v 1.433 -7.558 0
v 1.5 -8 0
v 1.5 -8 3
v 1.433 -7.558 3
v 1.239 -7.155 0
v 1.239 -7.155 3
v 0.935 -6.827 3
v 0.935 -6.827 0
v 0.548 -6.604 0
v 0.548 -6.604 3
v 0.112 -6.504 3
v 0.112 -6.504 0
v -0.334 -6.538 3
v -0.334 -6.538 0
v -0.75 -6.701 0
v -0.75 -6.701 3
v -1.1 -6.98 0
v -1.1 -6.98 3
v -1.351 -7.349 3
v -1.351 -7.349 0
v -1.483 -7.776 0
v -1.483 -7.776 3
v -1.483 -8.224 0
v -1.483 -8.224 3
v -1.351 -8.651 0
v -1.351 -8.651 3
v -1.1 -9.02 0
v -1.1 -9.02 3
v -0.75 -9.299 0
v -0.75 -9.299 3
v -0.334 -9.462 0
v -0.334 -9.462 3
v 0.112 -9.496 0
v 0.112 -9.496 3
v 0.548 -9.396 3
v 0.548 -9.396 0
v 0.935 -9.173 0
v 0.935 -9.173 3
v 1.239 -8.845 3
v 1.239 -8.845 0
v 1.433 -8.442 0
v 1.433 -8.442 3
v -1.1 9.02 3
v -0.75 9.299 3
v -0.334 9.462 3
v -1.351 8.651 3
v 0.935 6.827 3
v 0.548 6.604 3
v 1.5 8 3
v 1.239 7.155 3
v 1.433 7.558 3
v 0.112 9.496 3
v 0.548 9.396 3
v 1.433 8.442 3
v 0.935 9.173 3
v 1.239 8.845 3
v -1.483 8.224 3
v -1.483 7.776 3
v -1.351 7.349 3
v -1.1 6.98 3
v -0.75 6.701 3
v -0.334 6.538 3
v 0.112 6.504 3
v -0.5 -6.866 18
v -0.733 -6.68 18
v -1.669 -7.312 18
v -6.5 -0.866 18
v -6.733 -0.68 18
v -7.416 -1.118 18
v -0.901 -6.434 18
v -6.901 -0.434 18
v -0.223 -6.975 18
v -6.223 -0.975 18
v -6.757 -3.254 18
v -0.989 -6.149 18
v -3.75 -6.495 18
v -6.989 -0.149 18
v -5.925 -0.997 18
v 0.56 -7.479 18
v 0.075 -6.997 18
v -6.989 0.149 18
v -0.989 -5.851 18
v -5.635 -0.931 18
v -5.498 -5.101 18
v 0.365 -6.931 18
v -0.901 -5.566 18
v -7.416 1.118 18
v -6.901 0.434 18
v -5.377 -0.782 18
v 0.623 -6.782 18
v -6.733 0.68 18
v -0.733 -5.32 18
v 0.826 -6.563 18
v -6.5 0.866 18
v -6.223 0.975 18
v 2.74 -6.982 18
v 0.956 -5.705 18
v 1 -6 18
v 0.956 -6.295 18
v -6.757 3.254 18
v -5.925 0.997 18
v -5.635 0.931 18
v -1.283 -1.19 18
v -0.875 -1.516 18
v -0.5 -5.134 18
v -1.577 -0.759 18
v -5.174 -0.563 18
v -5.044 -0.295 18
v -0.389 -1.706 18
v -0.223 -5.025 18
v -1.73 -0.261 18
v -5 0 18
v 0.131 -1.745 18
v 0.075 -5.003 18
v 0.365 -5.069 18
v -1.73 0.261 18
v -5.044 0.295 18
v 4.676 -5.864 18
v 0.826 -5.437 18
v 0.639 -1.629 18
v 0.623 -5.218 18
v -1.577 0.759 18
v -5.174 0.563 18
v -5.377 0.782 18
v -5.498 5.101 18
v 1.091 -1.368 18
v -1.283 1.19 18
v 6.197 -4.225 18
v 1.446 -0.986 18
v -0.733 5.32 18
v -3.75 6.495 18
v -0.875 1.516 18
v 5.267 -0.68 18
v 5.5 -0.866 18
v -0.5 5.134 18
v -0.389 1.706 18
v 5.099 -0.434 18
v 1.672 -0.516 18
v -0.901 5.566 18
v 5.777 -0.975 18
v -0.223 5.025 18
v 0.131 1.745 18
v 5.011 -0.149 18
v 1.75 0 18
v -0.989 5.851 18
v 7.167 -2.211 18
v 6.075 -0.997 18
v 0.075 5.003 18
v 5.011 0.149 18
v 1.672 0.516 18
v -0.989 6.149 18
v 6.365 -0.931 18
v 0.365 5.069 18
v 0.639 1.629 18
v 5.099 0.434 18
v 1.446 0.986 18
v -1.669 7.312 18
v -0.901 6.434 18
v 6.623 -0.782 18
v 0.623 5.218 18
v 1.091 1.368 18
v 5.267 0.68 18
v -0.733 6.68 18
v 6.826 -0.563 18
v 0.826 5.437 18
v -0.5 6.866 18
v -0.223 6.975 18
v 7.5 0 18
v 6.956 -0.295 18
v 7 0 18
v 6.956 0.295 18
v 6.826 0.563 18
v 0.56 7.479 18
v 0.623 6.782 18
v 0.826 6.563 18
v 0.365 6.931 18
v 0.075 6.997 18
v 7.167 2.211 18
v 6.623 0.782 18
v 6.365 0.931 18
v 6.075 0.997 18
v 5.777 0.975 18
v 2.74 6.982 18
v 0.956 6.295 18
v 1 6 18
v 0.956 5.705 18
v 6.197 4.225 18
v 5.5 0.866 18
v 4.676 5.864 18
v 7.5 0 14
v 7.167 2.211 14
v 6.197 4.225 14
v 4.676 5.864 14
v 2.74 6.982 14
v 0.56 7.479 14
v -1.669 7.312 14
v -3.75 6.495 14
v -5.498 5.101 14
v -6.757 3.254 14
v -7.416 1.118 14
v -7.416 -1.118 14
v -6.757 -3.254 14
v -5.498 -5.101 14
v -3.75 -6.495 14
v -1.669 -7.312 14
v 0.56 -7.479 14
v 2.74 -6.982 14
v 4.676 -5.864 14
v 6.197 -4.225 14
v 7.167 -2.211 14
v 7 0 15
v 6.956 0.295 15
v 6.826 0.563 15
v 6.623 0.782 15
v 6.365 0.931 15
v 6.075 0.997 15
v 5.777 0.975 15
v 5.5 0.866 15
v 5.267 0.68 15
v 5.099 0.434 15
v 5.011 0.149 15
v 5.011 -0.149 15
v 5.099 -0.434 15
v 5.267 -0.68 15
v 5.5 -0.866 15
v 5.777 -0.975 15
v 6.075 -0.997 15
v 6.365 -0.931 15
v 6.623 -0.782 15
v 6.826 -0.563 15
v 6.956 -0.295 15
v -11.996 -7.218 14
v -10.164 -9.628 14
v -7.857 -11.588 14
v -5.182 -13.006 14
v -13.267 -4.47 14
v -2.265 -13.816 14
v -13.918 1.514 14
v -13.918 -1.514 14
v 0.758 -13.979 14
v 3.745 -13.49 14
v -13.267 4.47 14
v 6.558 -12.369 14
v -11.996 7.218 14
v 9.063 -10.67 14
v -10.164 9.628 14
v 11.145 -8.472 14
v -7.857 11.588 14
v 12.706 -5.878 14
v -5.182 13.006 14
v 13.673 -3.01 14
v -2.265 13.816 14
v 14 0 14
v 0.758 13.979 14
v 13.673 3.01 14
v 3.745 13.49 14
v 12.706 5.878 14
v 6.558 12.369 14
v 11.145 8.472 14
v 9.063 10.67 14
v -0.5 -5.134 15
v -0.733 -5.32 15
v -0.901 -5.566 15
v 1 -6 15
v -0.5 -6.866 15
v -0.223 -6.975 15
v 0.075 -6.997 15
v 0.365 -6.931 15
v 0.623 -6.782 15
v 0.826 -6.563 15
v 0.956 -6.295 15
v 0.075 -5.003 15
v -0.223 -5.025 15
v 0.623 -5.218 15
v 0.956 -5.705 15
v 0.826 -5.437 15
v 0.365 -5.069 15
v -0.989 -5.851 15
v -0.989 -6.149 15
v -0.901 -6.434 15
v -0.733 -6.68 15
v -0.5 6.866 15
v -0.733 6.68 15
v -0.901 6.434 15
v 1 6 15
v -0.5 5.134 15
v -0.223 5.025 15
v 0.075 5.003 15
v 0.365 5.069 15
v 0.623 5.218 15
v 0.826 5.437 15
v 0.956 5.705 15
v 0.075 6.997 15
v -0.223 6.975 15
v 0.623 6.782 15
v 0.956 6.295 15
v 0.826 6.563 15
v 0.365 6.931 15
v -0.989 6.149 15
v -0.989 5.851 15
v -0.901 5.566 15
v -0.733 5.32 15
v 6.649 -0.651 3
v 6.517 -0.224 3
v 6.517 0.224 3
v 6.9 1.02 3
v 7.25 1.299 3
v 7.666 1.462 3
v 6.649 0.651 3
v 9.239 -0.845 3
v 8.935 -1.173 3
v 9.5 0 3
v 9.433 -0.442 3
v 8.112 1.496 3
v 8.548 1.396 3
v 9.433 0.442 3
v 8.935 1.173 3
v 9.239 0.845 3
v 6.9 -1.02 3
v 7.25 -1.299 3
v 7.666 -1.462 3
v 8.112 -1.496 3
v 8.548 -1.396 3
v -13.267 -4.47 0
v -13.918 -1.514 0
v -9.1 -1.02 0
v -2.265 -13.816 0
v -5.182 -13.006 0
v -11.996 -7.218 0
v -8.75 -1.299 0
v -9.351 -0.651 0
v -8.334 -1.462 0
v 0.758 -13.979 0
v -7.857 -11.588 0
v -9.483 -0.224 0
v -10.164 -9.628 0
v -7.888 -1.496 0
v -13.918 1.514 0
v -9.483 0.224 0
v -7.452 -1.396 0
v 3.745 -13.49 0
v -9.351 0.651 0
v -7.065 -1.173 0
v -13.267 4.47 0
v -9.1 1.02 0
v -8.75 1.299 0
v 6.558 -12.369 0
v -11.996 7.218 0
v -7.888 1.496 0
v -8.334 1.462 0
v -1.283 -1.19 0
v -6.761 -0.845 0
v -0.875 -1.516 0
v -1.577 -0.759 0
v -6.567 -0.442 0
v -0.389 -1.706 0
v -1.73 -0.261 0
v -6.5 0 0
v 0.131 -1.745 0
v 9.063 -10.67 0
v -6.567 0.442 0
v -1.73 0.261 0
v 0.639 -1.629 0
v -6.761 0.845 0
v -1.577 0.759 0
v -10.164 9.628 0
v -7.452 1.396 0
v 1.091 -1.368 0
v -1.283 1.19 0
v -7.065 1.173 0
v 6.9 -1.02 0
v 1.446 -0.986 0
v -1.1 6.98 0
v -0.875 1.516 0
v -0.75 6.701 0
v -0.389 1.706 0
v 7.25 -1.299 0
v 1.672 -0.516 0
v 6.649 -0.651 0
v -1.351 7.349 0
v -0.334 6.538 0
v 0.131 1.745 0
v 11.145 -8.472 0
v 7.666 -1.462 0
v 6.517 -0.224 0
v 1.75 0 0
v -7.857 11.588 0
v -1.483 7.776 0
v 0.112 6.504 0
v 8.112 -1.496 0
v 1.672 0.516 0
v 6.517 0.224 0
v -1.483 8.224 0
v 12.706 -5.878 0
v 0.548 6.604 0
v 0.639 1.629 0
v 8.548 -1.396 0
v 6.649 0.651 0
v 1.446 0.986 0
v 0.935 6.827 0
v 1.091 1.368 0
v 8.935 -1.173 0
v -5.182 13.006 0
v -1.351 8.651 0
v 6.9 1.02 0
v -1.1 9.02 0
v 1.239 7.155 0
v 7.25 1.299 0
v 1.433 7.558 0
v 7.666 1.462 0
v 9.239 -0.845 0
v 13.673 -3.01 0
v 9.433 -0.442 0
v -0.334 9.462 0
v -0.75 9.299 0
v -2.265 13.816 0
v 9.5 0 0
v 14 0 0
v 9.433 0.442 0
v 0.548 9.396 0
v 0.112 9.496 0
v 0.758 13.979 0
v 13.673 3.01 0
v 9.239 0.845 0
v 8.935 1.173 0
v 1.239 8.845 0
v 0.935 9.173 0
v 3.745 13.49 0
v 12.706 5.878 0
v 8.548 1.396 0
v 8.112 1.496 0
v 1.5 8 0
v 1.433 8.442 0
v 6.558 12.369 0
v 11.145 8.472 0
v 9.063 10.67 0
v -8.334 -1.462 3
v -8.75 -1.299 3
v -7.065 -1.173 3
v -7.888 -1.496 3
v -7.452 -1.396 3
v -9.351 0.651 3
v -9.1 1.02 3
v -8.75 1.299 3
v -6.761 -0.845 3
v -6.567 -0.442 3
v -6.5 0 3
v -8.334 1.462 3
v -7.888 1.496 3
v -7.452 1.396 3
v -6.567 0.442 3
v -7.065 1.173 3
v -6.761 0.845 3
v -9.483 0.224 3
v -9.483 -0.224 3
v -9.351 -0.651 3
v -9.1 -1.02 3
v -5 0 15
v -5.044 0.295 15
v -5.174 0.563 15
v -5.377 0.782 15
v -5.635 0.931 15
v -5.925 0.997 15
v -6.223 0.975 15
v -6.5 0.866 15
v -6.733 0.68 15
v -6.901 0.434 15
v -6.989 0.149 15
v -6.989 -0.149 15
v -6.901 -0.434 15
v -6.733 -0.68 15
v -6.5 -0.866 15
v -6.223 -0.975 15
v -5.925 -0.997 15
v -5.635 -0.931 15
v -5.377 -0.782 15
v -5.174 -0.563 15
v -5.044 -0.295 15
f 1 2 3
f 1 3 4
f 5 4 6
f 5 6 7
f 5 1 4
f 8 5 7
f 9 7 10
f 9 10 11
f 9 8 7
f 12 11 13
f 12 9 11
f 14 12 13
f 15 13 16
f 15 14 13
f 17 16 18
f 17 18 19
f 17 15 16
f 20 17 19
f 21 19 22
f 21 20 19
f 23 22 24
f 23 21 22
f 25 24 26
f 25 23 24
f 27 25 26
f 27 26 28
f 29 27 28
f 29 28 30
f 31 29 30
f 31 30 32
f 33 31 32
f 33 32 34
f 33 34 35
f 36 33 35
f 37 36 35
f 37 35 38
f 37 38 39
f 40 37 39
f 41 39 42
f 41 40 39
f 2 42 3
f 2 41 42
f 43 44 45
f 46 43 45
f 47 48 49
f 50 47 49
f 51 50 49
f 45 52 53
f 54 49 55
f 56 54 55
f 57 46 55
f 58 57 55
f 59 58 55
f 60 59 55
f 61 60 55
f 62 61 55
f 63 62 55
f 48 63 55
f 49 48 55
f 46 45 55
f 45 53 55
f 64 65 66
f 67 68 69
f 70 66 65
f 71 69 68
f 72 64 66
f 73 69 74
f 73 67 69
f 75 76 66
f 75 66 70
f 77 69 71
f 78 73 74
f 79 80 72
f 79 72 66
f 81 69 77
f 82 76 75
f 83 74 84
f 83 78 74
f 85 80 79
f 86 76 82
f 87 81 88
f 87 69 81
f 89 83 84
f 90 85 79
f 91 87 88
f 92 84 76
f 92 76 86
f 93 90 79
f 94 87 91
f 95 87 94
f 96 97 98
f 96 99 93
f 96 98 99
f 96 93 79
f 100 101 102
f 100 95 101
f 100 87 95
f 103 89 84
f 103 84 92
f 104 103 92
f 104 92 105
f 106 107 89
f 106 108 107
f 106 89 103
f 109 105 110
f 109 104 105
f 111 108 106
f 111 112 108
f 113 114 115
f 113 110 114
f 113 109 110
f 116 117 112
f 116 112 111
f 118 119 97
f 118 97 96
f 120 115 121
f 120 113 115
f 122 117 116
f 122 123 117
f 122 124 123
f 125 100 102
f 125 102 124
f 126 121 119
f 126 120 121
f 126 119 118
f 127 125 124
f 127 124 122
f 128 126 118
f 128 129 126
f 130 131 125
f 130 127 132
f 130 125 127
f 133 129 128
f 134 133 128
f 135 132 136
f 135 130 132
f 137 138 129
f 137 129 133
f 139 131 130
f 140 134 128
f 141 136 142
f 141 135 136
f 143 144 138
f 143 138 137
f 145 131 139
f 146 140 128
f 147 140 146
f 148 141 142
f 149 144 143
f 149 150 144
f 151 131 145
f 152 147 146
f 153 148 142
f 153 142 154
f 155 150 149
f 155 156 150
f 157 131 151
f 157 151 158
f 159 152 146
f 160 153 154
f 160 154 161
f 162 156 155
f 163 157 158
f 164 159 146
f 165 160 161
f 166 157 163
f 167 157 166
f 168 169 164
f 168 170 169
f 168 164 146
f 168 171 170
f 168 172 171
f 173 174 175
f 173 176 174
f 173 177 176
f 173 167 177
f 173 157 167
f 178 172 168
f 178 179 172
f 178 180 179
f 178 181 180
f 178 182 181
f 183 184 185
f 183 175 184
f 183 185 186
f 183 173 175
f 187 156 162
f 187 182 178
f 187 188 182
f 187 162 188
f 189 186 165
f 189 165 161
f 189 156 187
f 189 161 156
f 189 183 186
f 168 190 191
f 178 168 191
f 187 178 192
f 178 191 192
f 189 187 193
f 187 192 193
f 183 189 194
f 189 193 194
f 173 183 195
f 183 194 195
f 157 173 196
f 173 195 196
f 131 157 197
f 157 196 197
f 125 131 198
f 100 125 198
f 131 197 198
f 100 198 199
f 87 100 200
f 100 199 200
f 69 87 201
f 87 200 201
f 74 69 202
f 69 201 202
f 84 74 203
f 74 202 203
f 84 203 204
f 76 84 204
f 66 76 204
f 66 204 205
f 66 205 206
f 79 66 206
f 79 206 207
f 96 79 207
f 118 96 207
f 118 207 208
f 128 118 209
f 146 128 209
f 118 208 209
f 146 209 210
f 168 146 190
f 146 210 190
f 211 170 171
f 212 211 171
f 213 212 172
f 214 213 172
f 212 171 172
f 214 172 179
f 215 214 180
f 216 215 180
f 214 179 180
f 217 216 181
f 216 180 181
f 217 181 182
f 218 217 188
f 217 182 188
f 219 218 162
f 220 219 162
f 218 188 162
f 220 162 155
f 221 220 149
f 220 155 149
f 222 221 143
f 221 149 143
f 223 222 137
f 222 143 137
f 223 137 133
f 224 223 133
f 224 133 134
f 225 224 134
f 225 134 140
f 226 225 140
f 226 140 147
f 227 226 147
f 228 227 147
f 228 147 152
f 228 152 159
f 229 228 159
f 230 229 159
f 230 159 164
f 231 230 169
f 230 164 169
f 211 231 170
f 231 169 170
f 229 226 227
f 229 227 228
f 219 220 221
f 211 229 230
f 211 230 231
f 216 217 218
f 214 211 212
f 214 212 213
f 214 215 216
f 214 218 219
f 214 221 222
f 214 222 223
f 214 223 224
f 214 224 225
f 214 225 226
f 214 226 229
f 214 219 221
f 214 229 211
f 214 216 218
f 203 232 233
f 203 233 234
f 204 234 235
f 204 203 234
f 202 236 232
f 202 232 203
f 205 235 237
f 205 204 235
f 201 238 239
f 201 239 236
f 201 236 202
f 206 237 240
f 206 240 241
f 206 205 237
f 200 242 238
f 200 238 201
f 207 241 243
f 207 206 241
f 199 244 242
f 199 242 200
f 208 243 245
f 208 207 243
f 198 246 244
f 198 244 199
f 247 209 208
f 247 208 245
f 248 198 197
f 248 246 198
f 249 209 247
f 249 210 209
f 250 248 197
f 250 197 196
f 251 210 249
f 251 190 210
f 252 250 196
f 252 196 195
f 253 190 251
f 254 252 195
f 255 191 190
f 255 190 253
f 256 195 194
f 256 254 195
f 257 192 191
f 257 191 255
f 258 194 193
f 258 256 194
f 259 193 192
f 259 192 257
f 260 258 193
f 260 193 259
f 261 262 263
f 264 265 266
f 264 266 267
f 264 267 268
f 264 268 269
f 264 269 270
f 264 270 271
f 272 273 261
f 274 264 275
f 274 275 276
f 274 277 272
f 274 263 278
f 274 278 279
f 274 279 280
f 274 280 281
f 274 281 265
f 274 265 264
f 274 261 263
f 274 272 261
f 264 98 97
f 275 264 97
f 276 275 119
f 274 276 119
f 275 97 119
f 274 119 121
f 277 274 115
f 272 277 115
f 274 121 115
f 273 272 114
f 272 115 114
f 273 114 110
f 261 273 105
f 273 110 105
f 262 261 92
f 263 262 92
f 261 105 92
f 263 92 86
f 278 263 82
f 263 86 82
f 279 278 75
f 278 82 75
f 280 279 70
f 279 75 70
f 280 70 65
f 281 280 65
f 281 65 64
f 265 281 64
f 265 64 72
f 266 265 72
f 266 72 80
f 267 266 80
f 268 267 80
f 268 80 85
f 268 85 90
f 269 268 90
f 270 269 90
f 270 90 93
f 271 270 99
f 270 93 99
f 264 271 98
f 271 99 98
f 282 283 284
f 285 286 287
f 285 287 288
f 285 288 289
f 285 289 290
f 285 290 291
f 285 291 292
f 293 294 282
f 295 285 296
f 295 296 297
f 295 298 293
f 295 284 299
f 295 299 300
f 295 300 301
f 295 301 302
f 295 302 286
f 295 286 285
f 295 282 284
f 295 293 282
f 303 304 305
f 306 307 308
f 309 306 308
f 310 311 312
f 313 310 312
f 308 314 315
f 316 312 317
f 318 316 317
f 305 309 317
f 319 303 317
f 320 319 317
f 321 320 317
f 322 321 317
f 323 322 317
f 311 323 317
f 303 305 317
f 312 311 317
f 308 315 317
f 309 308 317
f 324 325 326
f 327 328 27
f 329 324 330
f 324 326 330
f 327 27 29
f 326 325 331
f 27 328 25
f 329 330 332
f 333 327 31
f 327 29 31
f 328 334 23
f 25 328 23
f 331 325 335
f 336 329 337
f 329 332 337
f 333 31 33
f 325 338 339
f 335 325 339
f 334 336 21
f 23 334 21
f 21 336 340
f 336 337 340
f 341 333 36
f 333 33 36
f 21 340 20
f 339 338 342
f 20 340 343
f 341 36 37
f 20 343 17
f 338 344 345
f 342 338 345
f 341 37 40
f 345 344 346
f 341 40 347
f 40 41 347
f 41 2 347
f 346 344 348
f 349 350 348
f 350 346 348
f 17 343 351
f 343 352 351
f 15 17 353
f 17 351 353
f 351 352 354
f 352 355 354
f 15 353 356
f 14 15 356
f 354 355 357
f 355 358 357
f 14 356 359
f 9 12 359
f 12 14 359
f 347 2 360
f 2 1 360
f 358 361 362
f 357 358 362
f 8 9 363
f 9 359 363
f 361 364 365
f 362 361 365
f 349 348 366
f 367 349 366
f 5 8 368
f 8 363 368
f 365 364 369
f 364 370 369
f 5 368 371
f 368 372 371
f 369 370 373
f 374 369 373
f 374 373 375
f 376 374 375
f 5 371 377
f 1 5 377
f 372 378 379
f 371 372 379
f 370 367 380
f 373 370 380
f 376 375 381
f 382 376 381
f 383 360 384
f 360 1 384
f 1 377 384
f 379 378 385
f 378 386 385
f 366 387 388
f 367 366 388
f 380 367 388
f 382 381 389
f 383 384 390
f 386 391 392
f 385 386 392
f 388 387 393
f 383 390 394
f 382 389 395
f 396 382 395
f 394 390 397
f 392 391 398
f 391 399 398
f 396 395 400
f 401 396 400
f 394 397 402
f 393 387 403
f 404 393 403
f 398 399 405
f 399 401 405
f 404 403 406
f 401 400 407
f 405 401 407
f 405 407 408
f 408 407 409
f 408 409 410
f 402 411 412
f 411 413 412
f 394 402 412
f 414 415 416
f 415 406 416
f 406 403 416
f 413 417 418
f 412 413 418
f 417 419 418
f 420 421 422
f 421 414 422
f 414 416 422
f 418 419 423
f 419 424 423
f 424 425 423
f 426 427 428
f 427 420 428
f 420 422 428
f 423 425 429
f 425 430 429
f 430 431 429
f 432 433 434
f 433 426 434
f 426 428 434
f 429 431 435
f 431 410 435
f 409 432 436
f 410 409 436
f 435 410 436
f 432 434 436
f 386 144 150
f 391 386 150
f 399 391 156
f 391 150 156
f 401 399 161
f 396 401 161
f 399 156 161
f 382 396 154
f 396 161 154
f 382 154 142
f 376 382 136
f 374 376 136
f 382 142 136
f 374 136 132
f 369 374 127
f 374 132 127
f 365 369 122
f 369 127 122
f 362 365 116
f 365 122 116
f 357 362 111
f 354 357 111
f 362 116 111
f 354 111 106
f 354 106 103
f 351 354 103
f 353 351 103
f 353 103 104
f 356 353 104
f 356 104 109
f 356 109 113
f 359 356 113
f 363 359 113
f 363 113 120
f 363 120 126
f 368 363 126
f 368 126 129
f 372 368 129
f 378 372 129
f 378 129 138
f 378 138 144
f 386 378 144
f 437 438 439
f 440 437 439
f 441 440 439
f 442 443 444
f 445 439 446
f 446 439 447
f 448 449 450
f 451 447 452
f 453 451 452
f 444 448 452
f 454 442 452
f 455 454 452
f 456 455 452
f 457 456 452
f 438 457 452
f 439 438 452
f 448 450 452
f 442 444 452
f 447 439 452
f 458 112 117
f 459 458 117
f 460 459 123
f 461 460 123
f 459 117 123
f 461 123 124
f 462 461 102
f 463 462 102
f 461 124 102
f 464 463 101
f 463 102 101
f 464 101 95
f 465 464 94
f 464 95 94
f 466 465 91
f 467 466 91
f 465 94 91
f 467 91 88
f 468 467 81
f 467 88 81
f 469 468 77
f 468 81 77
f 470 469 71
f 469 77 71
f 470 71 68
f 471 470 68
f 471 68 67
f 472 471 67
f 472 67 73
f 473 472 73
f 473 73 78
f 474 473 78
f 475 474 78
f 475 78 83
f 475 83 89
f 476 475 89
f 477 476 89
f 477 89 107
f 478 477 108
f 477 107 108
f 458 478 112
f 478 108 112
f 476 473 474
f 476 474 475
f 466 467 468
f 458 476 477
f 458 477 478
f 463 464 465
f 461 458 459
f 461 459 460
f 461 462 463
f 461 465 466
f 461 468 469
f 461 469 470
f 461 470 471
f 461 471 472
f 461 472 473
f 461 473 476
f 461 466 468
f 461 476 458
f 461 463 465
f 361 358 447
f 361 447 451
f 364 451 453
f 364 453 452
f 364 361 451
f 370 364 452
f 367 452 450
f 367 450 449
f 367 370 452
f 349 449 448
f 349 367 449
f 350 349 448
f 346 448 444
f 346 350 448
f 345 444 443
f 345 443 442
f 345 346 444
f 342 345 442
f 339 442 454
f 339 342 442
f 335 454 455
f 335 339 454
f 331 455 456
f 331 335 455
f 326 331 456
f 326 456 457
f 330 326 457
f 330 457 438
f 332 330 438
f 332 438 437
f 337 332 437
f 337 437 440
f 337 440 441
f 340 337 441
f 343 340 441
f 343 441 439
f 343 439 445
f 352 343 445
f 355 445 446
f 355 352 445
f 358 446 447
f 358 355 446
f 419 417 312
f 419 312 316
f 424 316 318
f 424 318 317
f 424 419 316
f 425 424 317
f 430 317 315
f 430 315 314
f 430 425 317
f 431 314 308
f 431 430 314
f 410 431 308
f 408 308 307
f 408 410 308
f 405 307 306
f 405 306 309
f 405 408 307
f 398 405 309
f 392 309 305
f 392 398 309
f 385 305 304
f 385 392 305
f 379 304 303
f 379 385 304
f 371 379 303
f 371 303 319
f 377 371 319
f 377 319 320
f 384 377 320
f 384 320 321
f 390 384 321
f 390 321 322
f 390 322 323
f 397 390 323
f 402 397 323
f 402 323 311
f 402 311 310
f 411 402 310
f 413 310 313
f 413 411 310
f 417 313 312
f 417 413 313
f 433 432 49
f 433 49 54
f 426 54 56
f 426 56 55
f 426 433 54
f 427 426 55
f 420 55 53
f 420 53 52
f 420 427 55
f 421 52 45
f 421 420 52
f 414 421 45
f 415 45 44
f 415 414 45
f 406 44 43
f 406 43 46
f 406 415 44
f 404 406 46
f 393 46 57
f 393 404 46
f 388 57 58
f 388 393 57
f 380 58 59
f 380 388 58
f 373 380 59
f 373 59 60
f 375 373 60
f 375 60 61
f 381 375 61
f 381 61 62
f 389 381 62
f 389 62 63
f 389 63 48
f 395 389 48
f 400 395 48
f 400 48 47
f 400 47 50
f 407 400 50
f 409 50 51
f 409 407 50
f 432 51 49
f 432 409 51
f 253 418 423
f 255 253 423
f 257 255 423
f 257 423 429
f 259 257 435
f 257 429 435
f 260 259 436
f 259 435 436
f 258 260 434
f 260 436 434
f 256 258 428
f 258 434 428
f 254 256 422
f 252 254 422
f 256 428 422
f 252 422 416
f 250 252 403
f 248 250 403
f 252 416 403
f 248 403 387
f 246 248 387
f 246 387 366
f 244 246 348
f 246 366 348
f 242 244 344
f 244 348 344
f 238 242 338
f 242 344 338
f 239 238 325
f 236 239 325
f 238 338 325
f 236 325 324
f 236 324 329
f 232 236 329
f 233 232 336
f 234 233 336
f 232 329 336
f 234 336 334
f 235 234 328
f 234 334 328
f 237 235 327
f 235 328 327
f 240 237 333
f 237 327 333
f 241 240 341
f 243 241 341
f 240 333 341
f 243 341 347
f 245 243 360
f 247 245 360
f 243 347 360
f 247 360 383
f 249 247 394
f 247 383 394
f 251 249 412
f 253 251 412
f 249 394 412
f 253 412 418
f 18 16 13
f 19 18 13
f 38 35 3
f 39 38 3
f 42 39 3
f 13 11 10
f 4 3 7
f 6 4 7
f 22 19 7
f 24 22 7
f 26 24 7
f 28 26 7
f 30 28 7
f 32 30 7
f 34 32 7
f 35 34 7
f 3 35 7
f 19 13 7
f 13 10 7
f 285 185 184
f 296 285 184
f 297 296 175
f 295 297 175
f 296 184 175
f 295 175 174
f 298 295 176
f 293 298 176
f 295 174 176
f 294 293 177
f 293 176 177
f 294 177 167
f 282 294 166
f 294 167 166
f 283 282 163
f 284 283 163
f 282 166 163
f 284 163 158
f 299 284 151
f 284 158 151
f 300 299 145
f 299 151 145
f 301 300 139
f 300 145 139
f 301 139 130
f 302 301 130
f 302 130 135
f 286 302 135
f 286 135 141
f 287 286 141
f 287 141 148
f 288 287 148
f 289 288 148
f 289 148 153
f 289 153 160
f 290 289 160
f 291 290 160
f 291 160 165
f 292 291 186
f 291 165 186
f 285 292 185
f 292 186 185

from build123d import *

# Parameters (mm, degrees)
SKETCH_1_R          = 14
EXTRUDE_1_DEPTH     = 14
SKETCH_3_R          = 7.5
EXTRUDE_3_DEPTH     = 4
SKETCH_4_R          = 1.75
CUT_EXTRUDE_1_DEPTH = 27.758176321
SKETCH_5_R          = 1
CUT_EXTRUDE_2_DEPTH = 3
SKETCH_6_R          = 1.5
CUT_EXTRUDE_3_DEPTH = 3


with BuildPart() as part:
    # 草图1 → 凸台-拉伸1 (new body)
    with BuildSketch(Plane.XY):
        Circle(SKETCH_1_R)
    extrude(amount=EXTRUDE_1_DEPTH)

    # 草图3 → 凸台-拉伸3 (add)
    with BuildSketch(Plane.XY.offset(14)):
        Circle(SKETCH_3_R)
    extrude(amount=EXTRUDE_3_DEPTH)

    # 草图4 → 切除-拉伸1 (cut, through all)
    with BuildSketch(Plane.XY.offset(18)):
        Circle(SKETCH_4_R)
    extrude(amount=-CUT_EXTRUDE_1_DEPTH, mode=Mode.SUBTRACT)

    # 草图5 → 切除-拉伸2 (cut)
    with BuildSketch(Plane.XY.offset(18)):
        with Locations((0, -6)):
            Circle(SKETCH_5_R)
        with Locations((-6, 0)):
            Circle(SKETCH_5_R)
        with Locations((0, 6)):
            Circle(SKETCH_5_R)
        with Locations((6, 0)):
            Circle(SKETCH_5_R)
    extrude(amount=-CUT_EXTRUDE_2_DEPTH, mode=Mode.SUBTRACT)

    # 草图6 → 切除-拉伸3 (cut)
    with BuildSketch(Plane.XY):
        with Locations((0, 8)):
            Circle(SKETCH_6_R)
        with Locations((-8, 0)):
            Circle(SKETCH_6_R)
        with Locations((0, -8)):
            Circle(SKETCH_6_R)
        with Locations((8, 0)):
            Circle(SKETCH_6_R)
    extrude(amount=CUT_EXTRUDE_3_DEPTH, mode=Mode.SUBTRACT)


solid = part.part
